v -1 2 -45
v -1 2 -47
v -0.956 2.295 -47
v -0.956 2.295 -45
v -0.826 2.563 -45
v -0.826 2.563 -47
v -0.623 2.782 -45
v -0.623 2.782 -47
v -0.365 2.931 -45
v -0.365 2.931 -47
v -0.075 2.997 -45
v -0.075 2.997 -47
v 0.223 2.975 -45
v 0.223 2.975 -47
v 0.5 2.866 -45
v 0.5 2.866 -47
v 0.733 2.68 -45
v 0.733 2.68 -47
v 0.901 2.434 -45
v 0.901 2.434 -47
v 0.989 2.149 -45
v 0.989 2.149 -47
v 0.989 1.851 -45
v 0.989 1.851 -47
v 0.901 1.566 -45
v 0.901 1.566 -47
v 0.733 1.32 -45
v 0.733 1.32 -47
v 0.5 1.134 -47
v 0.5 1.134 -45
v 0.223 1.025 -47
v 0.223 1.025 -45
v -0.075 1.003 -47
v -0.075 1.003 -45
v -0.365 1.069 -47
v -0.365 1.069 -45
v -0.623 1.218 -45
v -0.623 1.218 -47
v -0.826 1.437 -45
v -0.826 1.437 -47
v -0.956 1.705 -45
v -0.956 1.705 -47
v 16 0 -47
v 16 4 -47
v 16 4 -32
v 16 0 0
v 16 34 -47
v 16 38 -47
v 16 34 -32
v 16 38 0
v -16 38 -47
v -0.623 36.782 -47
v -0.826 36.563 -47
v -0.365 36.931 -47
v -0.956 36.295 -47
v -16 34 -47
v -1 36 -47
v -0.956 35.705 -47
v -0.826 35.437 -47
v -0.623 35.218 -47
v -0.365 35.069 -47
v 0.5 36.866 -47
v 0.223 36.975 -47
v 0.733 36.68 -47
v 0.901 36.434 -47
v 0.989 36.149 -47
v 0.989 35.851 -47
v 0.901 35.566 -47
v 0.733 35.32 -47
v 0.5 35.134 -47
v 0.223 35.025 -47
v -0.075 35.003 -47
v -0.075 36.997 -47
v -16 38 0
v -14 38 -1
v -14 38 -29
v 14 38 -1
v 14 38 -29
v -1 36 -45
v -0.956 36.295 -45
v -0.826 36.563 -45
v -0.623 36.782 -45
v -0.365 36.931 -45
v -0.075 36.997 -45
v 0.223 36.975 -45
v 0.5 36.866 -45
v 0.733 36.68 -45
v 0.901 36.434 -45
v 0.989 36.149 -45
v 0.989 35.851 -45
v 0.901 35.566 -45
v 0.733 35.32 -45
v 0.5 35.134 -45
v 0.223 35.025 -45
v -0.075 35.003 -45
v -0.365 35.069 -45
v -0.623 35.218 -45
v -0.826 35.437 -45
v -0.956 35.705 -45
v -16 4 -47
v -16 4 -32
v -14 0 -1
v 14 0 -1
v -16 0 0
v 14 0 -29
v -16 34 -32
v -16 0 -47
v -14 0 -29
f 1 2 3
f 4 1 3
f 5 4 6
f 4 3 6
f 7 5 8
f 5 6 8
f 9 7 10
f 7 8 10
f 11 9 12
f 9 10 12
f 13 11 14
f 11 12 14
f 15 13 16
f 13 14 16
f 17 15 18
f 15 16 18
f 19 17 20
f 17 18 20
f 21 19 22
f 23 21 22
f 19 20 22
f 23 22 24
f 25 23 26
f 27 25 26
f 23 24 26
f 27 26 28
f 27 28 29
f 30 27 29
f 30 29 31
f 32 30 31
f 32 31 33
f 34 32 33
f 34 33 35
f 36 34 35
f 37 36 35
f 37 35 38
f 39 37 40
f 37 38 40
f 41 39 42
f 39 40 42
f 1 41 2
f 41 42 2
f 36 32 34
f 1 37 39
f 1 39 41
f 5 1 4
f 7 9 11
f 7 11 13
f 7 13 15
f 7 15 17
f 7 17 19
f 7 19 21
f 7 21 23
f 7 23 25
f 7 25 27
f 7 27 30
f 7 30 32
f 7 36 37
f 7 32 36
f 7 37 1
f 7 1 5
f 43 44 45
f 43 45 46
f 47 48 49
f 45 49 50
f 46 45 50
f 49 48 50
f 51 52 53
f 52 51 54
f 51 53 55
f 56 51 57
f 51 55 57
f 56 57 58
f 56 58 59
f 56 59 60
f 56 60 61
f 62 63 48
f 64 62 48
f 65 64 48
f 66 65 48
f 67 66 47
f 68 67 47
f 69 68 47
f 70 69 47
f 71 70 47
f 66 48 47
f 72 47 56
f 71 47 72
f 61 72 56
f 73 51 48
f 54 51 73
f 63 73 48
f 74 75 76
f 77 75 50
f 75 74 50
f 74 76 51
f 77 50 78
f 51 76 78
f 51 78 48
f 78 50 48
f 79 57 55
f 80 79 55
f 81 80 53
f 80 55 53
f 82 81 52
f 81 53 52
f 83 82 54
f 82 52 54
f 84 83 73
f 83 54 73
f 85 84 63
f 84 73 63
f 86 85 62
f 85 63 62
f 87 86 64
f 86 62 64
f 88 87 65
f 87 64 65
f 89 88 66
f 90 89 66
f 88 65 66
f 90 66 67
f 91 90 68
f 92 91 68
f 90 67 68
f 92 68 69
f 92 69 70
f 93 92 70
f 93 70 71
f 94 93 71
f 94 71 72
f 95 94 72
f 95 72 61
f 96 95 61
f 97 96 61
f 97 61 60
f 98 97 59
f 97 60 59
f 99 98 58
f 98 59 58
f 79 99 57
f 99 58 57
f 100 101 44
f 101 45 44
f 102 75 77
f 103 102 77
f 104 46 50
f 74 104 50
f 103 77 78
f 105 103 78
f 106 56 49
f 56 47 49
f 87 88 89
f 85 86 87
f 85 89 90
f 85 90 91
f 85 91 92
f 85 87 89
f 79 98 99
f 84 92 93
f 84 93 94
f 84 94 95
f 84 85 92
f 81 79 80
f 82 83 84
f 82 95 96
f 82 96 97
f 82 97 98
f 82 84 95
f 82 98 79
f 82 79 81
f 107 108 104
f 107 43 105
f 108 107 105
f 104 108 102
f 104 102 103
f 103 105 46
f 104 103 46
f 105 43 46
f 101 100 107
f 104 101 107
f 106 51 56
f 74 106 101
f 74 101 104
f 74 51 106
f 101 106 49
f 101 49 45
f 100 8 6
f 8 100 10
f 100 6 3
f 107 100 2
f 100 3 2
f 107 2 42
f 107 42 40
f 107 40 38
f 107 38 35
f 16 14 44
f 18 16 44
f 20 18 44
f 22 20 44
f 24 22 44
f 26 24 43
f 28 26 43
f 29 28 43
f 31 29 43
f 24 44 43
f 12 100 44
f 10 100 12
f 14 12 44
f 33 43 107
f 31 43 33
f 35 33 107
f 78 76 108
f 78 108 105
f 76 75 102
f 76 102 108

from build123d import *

# Parameters (mm, degrees)
BOSS_EXTRUDE1_DEPTH = 16
SKETCH2_W           = 28
SKETCH2_H           = 28
CUT_EXTRUDE1_DEPTH  = 39
SKETCH3_R           = 1
CUT_EXTRUDE2_DEPTH  = 2


with BuildPart() as part:
    # Sketch1 → Boss-Extrude1 (new body, symmetric)
    with BuildSketch(Plane(origin=(0, 0, 0), x_dir=(0, 0, -1), z_dir=(1, 0, 0))):
        Polygon((0, 0), (0, 38), (47, 38), (47, 34), (32, 34), (32, 4), (47, 4), (47, 0), align=None)
    extrude(amount=BOSS_EXTRUDE1_DEPTH, both=True)

    # Sketch2 → Cut-Extrude1 (cut, through all)
    with BuildSketch(Plane(origin=(0, 38, 0), x_dir=(1, 0, 0), z_dir=(0, 1, 0))):
        with Locations((0, 15)):
            Rectangle(SKETCH2_W, SKETCH2_H)
    extrude(amount=-CUT_EXTRUDE1_DEPTH, mode=Mode.SUBTRACT)

    # Sketch3 → Cut-Extrude2 (cut)
    with BuildSketch(Plane(origin=(0, 0, -47), x_dir=(-1, 0, 0), z_dir=(0, 0, -1))):
        with Locations((0, 36)):
            Circle(SKETCH3_R)
        with Locations((0, 2)):
            Circle(SKETCH3_R)
    extrude(amount=-CUT_EXTRUDE2_DEPTH, mode=Mode.SUBTRACT)


solid = part.part
